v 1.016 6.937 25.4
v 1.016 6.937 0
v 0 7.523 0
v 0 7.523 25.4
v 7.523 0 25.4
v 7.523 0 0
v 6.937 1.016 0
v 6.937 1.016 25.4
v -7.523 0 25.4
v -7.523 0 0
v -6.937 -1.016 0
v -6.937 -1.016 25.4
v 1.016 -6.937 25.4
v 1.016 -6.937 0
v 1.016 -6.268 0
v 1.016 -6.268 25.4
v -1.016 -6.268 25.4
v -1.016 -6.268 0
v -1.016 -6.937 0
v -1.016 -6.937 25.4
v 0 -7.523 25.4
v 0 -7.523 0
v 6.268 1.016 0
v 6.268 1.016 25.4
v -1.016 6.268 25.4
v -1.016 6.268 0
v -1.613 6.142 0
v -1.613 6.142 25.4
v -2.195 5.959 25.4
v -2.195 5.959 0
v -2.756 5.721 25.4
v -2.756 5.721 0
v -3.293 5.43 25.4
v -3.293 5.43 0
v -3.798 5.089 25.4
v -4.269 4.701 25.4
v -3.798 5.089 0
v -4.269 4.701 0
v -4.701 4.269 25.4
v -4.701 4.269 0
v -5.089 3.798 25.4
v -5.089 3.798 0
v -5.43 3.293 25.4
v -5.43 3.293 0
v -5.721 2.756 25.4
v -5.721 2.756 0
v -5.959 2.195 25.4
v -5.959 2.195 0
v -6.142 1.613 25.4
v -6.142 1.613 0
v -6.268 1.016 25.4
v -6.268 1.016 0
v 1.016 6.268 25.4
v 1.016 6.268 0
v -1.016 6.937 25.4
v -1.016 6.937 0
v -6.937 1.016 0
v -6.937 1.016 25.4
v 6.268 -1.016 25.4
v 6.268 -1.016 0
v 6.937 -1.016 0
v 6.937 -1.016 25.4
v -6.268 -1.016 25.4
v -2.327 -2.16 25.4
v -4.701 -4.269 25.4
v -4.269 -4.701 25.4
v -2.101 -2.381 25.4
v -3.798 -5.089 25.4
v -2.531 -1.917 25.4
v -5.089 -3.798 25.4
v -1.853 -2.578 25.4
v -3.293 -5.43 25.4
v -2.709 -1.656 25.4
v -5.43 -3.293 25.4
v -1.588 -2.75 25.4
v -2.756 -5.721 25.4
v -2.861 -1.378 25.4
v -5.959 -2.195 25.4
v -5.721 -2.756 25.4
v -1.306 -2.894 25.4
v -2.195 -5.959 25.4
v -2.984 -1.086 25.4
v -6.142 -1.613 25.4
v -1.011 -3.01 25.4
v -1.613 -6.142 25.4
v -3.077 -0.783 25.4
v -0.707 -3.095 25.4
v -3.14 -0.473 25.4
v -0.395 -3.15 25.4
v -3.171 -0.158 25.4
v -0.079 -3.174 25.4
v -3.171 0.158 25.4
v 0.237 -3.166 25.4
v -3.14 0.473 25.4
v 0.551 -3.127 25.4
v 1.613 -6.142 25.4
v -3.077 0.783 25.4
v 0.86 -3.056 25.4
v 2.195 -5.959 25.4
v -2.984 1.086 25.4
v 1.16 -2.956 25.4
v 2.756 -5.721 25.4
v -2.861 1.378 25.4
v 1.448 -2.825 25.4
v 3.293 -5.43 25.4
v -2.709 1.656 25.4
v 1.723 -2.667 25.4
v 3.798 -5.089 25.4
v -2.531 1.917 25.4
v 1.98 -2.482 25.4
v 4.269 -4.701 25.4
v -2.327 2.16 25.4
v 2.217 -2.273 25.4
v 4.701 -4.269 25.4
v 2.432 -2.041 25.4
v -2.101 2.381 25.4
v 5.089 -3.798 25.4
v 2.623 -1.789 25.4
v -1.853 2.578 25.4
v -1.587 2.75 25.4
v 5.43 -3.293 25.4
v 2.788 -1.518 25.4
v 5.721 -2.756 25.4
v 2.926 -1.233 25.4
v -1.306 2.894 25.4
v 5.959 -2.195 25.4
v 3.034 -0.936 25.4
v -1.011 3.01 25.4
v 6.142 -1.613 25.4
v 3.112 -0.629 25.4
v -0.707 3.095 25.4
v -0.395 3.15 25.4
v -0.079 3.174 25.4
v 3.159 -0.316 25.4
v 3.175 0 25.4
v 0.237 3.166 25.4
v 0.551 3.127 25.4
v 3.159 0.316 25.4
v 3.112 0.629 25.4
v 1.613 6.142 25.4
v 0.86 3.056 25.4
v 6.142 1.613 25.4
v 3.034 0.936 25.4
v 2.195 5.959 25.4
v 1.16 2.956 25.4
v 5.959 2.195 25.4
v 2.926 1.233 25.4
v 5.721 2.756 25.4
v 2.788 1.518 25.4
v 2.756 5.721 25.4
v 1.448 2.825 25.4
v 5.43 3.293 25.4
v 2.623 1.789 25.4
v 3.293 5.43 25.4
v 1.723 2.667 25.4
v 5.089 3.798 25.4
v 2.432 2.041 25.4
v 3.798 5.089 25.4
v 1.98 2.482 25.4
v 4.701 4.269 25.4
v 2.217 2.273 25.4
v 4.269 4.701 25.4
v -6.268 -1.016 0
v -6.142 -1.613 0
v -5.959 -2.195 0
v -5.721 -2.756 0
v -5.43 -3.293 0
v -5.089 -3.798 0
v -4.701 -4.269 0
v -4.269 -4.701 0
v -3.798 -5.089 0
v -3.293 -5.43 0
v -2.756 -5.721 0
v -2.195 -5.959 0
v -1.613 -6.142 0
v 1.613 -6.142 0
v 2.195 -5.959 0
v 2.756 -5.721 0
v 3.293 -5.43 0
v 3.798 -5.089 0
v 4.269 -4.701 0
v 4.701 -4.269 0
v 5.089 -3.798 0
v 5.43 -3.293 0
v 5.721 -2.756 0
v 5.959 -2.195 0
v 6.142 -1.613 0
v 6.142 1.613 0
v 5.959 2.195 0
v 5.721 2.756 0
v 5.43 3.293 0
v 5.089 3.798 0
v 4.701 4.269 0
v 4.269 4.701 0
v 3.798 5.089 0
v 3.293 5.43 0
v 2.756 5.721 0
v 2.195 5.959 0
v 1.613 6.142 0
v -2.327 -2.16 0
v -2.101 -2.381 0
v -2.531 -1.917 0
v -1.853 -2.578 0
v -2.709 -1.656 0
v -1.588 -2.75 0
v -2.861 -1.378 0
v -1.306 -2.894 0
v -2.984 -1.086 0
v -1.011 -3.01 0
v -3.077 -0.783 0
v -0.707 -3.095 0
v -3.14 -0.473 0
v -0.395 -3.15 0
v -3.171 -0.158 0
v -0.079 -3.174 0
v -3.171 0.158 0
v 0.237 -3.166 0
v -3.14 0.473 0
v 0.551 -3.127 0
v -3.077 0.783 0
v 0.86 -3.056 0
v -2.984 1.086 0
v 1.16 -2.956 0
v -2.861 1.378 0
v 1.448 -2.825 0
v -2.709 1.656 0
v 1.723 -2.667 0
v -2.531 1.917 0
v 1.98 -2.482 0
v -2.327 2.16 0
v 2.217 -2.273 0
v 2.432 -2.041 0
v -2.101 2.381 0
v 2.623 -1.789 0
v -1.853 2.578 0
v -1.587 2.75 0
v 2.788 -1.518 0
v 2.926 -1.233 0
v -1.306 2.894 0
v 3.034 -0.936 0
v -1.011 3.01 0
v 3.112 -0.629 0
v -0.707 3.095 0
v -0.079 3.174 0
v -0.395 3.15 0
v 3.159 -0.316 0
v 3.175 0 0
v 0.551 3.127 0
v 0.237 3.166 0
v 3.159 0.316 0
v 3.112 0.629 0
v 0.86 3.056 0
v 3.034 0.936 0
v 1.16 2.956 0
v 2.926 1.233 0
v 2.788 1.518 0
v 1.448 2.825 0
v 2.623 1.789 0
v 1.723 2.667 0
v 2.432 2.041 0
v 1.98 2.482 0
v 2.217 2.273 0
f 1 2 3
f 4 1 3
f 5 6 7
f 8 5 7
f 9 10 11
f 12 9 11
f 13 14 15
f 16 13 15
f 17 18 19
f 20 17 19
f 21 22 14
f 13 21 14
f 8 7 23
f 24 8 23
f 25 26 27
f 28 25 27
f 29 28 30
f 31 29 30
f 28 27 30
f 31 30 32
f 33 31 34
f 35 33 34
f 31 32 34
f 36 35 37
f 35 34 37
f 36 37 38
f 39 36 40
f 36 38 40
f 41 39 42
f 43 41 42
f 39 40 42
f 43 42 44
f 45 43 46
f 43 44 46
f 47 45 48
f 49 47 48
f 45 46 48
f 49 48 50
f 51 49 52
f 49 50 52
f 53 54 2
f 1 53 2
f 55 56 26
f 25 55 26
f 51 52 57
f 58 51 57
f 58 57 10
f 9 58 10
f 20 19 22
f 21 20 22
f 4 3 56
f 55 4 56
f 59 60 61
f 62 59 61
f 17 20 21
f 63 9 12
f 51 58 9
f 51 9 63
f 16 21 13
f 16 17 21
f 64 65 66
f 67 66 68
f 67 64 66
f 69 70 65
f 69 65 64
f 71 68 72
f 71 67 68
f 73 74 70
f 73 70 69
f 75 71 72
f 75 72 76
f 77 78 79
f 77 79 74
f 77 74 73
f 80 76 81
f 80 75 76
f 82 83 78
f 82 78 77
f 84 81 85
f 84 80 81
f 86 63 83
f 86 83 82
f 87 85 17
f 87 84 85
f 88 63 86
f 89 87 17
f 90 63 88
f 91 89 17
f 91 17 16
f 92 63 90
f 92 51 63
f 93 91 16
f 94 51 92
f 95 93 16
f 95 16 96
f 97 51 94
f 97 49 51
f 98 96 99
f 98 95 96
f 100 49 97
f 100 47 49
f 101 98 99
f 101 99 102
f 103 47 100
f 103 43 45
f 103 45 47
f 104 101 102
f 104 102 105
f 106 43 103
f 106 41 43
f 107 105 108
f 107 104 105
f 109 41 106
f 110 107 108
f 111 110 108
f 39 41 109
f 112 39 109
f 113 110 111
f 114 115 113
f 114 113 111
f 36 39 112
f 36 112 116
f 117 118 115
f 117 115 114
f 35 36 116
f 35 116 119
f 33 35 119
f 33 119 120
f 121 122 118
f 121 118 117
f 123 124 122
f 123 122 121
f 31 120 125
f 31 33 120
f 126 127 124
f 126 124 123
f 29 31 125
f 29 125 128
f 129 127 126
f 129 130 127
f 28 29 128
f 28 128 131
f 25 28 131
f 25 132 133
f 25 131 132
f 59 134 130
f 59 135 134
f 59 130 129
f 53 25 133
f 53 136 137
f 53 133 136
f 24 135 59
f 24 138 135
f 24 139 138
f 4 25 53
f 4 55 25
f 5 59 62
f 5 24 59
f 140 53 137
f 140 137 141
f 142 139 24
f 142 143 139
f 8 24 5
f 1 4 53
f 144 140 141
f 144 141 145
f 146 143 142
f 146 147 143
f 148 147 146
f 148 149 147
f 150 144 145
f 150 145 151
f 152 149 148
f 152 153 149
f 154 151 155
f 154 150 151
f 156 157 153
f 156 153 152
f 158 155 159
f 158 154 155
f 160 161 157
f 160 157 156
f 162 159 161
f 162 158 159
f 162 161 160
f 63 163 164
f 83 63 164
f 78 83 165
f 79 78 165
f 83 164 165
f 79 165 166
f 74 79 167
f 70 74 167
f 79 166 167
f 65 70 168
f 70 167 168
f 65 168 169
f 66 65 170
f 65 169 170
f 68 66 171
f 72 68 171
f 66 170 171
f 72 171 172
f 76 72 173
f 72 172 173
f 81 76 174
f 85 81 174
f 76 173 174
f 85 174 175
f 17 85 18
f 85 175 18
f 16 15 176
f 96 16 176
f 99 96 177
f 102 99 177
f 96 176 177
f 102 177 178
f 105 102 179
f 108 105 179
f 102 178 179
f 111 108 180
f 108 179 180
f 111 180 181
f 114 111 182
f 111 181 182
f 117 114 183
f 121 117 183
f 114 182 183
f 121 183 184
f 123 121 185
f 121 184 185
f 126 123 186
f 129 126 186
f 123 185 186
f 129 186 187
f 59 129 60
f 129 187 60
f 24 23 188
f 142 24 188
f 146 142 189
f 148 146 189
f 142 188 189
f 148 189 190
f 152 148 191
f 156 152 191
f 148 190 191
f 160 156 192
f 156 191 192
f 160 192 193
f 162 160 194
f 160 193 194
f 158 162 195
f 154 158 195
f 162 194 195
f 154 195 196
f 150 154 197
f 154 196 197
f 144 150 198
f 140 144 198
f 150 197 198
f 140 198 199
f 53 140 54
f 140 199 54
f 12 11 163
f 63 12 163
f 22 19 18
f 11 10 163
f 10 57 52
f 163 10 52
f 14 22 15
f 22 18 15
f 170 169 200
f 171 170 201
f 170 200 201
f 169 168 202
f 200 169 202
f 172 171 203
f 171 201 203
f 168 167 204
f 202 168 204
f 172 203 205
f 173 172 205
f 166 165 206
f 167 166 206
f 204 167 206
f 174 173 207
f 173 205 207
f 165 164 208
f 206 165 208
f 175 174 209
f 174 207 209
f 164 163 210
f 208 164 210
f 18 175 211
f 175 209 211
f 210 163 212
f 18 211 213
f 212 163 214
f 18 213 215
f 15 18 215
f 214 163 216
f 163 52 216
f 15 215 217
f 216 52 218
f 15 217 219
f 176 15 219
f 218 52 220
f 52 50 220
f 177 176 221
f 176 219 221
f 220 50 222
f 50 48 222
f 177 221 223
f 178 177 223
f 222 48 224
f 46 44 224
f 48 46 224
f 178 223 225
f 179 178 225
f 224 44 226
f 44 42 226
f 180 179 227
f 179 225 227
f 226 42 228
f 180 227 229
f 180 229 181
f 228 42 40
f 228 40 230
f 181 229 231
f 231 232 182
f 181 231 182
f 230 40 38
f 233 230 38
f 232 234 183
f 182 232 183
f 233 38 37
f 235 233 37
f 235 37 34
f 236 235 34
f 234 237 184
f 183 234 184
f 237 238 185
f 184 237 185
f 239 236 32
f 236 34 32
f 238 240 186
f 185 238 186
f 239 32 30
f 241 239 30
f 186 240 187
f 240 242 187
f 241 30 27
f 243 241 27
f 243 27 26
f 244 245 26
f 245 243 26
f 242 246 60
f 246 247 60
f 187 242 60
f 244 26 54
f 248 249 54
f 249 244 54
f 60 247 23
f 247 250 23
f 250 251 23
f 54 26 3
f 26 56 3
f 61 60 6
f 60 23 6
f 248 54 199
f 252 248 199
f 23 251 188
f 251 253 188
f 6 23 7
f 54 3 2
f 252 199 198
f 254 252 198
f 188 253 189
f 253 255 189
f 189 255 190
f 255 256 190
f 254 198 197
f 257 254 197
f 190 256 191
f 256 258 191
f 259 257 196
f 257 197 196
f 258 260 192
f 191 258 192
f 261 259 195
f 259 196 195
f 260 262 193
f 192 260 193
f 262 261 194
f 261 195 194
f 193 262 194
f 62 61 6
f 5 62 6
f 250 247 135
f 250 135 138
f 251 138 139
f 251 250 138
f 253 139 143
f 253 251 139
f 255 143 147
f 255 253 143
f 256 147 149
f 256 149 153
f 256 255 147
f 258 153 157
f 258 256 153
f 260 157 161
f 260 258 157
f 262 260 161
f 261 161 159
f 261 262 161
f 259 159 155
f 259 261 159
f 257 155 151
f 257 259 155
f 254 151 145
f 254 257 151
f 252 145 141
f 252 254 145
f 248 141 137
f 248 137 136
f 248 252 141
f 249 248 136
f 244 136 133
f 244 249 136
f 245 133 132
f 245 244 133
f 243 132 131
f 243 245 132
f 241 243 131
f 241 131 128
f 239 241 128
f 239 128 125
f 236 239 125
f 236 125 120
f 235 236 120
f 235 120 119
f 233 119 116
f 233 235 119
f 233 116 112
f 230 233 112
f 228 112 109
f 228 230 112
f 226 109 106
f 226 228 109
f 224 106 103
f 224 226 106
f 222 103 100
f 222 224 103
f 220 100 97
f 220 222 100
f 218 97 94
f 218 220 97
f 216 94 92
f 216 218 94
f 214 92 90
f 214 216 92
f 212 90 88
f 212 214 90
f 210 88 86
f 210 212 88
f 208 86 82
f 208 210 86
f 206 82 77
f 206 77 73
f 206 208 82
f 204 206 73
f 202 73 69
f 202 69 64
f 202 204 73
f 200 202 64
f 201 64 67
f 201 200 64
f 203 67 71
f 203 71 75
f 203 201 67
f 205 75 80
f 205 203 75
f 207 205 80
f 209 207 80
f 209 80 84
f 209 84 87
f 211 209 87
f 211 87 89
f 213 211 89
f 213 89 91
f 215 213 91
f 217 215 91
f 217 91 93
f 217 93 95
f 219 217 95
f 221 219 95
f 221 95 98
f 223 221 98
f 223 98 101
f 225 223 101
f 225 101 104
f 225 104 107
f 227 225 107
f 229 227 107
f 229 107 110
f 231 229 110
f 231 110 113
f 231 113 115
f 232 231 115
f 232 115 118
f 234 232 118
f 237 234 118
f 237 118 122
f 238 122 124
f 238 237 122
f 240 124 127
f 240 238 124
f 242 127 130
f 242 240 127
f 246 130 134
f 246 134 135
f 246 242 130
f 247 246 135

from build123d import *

# Parameters (mm, degrees)
F0_R     = 3.175
F1_DEPTH = 25.4


with BuildPart() as f1:
    # F0 (on Top) → F1 (new body)
    with BuildSketch(Plane.XY):
        with BuildLine():
            ThreePointArc((6.2681930411, -1.016), (6.3295152188, -0.5096440862), (6.35, 0))
            ThreePointArc((6.35, 0), (6.3295152188, 0.5096440862), (6.2681930411, 1.016))
            Line((6.2681930411, 1.016), (5.7634121265, 1.016))
            Line((5.7634121265, 1.016), (5.176824253, 0))
            Line((5.176824253, 0), (5.7634121265, -1.016))
            Line((5.7634121265, -1.016), (6.2681930411, -1.016))
        make_face()
        with BuildLine():
            ThreePointArc((6.2681930411, 1.016), (6.3295152188, 0.5096440862), (6.35, 0))
            ThreePointArc((6.35, 0), (6.3295152188, -0.5096440862), (6.2681930411, -1.016))
            Line((6.2681930411, -1.016), (6.9365878735, -1.016))
            Line((6.9365878735, -1.016), (7.523175747, 0))
            Line((7.523175747, 0), (6.9365878735, 1.016))
            Line((6.9365878735, 1.016), (6.2681930411, 1.016))
        make_face()
        with BuildLine():
            Line((5.7634121265, 1.016), (6.2681930411, 1.016))
            ThreePointArc((6.2681930411, 1.016), (4.4901280605, 4.4901280605), (1.016, 6.2681930411))
            Line((1.016, 6.2681930411), (1.016, 5.7634121265))
            Line((1.016, 5.7634121265), (0, 5.176824253))
            Line((0, 5.176824253), (-1.016, 5.7634121265))
            Line((-1.016, 5.7634121265), (-1.016, 6.2681930411))
            ThreePointArc((-1.016, 6.2681930411), (-4.4901280605, 4.4901280605), (-6.2681930411, 1.016))
            Line((-6.2681930411, 1.016), (-5.7634121265, 1.016))
            Line((-5.7634121265, 1.016), (-5.176824253, 0))
            Line((-5.176824253, 0), (-5.7634121265, -1.016))
            Line((-5.7634121265, -1.016), (-6.2681930411, -1.016))
            ThreePointArc((-6.2681930411, -1.016), (-4.4901280605, -4.4901280605), (-1.016, -6.2681930411))
            Line((-1.016, -6.2681930411), (-1.016, -5.7634121265))
            Line((-1.016, -5.7634121265), (0, -5.176824253))
            Line((0, -5.176824253), (1.016, -5.7634121265))
            Line((1.016, -5.7634121265), (1.016, -6.2681930411))
            ThreePointArc((1.016, -6.2681930411), (4.4901280605, -4.4901280605), (6.2681930411, -1.016))
            Line((6.2681930411, -1.016), (5.7634121265, -1.016))
            Line((5.7634121265, -1.016), (5.176824253, 0))
            Line((5.176824253, 0), (5.7634121265, 1.016))
        make_face()
        Circle(F0_R, mode=Mode.SUBTRACT)
        with BuildLine():
            Line((1.016, 5.7634121265), (1.016, 6.2681930411))
            ThreePointArc((1.016, 6.2681930411), (0, 6.35), (-1.016, 6.2681930411))
            Line((-1.016, 6.2681930411), (-1.016, 5.7634121265))
            Line((-1.016, 5.7634121265), (0, 5.176824253))
            Line((0, 5.176824253), (1.016, 5.7634121265))
        make_face()
        with BuildLine():
            ThreePointArc((-1.016, 6.2681930411), (0, 6.35), (1.016, 6.2681930411))
            Line((1.016, 6.2681930411), (1.016, 6.9365878735))
            Line((1.016, 6.9365878735), (0, 7.523175747))
            Line((0, 7.523175747), (-1.016, 6.9365878735))
            Line((-1.016, 6.9365878735), (-1.016, 6.2681930411))
        make_face()
        with BuildLine():
            Line((1.016, -6.9365878735), (1.016, -6.2681930411))
            ThreePointArc((1.016, -6.2681930411), (0, -6.35), (-1.016, -6.2681930411))
            Line((-1.016, -6.2681930411), (-1.016, -6.9365878735))
            Line((-1.016, -6.9365878735), (0, -7.523175747))
            Line((0, -7.523175747), (1.016, -6.9365878735))
        make_face()
        with BuildLine():
            ThreePointArc((-1.016, -6.2681930411), (0, -6.35), (1.016, -6.2681930411))
            Line((1.016, -6.2681930411), (1.016, -5.7634121265))
            Line((1.016, -5.7634121265), (0, -5.176824253))
            Line((0, -5.176824253), (-1.016, -5.7634121265))
            Line((-1.016, -5.7634121265), (-1.016, -6.2681930411))
        make_face()
        with BuildLine():
            Line((-5.7634121265, 1.016), (-6.2681930411, 1.016))
            ThreePointArc((-6.2681930411, 1.016), (-6.35, 0), (-6.2681930411, -1.016))
            Line((-6.2681930411, -1.016), (-5.7634121265, -1.016))
            Line((-5.7634121265, -1.016), (-5.176824253, 0))
            Line((-5.176824253, 0), (-5.7634121265, 1.016))
        make_face()
        with BuildLine():
            ThreePointArc((-6.2681930411, -1.016), (-6.35, 0), (-6.2681930411, 1.016))
            Line((-6.2681930411, 1.016), (-6.9365878735, 1.016))
            Line((-6.9365878735, 1.016), (-7.523175747, 0))
            Line((-7.523175747, 0), (-6.9365878735, -1.016))
            Line((-6.9365878735, -1.016), (-6.2681930411, -1.016))
        make_face()
    extrude(amount=F1_DEPTH)


solid = f1.part
